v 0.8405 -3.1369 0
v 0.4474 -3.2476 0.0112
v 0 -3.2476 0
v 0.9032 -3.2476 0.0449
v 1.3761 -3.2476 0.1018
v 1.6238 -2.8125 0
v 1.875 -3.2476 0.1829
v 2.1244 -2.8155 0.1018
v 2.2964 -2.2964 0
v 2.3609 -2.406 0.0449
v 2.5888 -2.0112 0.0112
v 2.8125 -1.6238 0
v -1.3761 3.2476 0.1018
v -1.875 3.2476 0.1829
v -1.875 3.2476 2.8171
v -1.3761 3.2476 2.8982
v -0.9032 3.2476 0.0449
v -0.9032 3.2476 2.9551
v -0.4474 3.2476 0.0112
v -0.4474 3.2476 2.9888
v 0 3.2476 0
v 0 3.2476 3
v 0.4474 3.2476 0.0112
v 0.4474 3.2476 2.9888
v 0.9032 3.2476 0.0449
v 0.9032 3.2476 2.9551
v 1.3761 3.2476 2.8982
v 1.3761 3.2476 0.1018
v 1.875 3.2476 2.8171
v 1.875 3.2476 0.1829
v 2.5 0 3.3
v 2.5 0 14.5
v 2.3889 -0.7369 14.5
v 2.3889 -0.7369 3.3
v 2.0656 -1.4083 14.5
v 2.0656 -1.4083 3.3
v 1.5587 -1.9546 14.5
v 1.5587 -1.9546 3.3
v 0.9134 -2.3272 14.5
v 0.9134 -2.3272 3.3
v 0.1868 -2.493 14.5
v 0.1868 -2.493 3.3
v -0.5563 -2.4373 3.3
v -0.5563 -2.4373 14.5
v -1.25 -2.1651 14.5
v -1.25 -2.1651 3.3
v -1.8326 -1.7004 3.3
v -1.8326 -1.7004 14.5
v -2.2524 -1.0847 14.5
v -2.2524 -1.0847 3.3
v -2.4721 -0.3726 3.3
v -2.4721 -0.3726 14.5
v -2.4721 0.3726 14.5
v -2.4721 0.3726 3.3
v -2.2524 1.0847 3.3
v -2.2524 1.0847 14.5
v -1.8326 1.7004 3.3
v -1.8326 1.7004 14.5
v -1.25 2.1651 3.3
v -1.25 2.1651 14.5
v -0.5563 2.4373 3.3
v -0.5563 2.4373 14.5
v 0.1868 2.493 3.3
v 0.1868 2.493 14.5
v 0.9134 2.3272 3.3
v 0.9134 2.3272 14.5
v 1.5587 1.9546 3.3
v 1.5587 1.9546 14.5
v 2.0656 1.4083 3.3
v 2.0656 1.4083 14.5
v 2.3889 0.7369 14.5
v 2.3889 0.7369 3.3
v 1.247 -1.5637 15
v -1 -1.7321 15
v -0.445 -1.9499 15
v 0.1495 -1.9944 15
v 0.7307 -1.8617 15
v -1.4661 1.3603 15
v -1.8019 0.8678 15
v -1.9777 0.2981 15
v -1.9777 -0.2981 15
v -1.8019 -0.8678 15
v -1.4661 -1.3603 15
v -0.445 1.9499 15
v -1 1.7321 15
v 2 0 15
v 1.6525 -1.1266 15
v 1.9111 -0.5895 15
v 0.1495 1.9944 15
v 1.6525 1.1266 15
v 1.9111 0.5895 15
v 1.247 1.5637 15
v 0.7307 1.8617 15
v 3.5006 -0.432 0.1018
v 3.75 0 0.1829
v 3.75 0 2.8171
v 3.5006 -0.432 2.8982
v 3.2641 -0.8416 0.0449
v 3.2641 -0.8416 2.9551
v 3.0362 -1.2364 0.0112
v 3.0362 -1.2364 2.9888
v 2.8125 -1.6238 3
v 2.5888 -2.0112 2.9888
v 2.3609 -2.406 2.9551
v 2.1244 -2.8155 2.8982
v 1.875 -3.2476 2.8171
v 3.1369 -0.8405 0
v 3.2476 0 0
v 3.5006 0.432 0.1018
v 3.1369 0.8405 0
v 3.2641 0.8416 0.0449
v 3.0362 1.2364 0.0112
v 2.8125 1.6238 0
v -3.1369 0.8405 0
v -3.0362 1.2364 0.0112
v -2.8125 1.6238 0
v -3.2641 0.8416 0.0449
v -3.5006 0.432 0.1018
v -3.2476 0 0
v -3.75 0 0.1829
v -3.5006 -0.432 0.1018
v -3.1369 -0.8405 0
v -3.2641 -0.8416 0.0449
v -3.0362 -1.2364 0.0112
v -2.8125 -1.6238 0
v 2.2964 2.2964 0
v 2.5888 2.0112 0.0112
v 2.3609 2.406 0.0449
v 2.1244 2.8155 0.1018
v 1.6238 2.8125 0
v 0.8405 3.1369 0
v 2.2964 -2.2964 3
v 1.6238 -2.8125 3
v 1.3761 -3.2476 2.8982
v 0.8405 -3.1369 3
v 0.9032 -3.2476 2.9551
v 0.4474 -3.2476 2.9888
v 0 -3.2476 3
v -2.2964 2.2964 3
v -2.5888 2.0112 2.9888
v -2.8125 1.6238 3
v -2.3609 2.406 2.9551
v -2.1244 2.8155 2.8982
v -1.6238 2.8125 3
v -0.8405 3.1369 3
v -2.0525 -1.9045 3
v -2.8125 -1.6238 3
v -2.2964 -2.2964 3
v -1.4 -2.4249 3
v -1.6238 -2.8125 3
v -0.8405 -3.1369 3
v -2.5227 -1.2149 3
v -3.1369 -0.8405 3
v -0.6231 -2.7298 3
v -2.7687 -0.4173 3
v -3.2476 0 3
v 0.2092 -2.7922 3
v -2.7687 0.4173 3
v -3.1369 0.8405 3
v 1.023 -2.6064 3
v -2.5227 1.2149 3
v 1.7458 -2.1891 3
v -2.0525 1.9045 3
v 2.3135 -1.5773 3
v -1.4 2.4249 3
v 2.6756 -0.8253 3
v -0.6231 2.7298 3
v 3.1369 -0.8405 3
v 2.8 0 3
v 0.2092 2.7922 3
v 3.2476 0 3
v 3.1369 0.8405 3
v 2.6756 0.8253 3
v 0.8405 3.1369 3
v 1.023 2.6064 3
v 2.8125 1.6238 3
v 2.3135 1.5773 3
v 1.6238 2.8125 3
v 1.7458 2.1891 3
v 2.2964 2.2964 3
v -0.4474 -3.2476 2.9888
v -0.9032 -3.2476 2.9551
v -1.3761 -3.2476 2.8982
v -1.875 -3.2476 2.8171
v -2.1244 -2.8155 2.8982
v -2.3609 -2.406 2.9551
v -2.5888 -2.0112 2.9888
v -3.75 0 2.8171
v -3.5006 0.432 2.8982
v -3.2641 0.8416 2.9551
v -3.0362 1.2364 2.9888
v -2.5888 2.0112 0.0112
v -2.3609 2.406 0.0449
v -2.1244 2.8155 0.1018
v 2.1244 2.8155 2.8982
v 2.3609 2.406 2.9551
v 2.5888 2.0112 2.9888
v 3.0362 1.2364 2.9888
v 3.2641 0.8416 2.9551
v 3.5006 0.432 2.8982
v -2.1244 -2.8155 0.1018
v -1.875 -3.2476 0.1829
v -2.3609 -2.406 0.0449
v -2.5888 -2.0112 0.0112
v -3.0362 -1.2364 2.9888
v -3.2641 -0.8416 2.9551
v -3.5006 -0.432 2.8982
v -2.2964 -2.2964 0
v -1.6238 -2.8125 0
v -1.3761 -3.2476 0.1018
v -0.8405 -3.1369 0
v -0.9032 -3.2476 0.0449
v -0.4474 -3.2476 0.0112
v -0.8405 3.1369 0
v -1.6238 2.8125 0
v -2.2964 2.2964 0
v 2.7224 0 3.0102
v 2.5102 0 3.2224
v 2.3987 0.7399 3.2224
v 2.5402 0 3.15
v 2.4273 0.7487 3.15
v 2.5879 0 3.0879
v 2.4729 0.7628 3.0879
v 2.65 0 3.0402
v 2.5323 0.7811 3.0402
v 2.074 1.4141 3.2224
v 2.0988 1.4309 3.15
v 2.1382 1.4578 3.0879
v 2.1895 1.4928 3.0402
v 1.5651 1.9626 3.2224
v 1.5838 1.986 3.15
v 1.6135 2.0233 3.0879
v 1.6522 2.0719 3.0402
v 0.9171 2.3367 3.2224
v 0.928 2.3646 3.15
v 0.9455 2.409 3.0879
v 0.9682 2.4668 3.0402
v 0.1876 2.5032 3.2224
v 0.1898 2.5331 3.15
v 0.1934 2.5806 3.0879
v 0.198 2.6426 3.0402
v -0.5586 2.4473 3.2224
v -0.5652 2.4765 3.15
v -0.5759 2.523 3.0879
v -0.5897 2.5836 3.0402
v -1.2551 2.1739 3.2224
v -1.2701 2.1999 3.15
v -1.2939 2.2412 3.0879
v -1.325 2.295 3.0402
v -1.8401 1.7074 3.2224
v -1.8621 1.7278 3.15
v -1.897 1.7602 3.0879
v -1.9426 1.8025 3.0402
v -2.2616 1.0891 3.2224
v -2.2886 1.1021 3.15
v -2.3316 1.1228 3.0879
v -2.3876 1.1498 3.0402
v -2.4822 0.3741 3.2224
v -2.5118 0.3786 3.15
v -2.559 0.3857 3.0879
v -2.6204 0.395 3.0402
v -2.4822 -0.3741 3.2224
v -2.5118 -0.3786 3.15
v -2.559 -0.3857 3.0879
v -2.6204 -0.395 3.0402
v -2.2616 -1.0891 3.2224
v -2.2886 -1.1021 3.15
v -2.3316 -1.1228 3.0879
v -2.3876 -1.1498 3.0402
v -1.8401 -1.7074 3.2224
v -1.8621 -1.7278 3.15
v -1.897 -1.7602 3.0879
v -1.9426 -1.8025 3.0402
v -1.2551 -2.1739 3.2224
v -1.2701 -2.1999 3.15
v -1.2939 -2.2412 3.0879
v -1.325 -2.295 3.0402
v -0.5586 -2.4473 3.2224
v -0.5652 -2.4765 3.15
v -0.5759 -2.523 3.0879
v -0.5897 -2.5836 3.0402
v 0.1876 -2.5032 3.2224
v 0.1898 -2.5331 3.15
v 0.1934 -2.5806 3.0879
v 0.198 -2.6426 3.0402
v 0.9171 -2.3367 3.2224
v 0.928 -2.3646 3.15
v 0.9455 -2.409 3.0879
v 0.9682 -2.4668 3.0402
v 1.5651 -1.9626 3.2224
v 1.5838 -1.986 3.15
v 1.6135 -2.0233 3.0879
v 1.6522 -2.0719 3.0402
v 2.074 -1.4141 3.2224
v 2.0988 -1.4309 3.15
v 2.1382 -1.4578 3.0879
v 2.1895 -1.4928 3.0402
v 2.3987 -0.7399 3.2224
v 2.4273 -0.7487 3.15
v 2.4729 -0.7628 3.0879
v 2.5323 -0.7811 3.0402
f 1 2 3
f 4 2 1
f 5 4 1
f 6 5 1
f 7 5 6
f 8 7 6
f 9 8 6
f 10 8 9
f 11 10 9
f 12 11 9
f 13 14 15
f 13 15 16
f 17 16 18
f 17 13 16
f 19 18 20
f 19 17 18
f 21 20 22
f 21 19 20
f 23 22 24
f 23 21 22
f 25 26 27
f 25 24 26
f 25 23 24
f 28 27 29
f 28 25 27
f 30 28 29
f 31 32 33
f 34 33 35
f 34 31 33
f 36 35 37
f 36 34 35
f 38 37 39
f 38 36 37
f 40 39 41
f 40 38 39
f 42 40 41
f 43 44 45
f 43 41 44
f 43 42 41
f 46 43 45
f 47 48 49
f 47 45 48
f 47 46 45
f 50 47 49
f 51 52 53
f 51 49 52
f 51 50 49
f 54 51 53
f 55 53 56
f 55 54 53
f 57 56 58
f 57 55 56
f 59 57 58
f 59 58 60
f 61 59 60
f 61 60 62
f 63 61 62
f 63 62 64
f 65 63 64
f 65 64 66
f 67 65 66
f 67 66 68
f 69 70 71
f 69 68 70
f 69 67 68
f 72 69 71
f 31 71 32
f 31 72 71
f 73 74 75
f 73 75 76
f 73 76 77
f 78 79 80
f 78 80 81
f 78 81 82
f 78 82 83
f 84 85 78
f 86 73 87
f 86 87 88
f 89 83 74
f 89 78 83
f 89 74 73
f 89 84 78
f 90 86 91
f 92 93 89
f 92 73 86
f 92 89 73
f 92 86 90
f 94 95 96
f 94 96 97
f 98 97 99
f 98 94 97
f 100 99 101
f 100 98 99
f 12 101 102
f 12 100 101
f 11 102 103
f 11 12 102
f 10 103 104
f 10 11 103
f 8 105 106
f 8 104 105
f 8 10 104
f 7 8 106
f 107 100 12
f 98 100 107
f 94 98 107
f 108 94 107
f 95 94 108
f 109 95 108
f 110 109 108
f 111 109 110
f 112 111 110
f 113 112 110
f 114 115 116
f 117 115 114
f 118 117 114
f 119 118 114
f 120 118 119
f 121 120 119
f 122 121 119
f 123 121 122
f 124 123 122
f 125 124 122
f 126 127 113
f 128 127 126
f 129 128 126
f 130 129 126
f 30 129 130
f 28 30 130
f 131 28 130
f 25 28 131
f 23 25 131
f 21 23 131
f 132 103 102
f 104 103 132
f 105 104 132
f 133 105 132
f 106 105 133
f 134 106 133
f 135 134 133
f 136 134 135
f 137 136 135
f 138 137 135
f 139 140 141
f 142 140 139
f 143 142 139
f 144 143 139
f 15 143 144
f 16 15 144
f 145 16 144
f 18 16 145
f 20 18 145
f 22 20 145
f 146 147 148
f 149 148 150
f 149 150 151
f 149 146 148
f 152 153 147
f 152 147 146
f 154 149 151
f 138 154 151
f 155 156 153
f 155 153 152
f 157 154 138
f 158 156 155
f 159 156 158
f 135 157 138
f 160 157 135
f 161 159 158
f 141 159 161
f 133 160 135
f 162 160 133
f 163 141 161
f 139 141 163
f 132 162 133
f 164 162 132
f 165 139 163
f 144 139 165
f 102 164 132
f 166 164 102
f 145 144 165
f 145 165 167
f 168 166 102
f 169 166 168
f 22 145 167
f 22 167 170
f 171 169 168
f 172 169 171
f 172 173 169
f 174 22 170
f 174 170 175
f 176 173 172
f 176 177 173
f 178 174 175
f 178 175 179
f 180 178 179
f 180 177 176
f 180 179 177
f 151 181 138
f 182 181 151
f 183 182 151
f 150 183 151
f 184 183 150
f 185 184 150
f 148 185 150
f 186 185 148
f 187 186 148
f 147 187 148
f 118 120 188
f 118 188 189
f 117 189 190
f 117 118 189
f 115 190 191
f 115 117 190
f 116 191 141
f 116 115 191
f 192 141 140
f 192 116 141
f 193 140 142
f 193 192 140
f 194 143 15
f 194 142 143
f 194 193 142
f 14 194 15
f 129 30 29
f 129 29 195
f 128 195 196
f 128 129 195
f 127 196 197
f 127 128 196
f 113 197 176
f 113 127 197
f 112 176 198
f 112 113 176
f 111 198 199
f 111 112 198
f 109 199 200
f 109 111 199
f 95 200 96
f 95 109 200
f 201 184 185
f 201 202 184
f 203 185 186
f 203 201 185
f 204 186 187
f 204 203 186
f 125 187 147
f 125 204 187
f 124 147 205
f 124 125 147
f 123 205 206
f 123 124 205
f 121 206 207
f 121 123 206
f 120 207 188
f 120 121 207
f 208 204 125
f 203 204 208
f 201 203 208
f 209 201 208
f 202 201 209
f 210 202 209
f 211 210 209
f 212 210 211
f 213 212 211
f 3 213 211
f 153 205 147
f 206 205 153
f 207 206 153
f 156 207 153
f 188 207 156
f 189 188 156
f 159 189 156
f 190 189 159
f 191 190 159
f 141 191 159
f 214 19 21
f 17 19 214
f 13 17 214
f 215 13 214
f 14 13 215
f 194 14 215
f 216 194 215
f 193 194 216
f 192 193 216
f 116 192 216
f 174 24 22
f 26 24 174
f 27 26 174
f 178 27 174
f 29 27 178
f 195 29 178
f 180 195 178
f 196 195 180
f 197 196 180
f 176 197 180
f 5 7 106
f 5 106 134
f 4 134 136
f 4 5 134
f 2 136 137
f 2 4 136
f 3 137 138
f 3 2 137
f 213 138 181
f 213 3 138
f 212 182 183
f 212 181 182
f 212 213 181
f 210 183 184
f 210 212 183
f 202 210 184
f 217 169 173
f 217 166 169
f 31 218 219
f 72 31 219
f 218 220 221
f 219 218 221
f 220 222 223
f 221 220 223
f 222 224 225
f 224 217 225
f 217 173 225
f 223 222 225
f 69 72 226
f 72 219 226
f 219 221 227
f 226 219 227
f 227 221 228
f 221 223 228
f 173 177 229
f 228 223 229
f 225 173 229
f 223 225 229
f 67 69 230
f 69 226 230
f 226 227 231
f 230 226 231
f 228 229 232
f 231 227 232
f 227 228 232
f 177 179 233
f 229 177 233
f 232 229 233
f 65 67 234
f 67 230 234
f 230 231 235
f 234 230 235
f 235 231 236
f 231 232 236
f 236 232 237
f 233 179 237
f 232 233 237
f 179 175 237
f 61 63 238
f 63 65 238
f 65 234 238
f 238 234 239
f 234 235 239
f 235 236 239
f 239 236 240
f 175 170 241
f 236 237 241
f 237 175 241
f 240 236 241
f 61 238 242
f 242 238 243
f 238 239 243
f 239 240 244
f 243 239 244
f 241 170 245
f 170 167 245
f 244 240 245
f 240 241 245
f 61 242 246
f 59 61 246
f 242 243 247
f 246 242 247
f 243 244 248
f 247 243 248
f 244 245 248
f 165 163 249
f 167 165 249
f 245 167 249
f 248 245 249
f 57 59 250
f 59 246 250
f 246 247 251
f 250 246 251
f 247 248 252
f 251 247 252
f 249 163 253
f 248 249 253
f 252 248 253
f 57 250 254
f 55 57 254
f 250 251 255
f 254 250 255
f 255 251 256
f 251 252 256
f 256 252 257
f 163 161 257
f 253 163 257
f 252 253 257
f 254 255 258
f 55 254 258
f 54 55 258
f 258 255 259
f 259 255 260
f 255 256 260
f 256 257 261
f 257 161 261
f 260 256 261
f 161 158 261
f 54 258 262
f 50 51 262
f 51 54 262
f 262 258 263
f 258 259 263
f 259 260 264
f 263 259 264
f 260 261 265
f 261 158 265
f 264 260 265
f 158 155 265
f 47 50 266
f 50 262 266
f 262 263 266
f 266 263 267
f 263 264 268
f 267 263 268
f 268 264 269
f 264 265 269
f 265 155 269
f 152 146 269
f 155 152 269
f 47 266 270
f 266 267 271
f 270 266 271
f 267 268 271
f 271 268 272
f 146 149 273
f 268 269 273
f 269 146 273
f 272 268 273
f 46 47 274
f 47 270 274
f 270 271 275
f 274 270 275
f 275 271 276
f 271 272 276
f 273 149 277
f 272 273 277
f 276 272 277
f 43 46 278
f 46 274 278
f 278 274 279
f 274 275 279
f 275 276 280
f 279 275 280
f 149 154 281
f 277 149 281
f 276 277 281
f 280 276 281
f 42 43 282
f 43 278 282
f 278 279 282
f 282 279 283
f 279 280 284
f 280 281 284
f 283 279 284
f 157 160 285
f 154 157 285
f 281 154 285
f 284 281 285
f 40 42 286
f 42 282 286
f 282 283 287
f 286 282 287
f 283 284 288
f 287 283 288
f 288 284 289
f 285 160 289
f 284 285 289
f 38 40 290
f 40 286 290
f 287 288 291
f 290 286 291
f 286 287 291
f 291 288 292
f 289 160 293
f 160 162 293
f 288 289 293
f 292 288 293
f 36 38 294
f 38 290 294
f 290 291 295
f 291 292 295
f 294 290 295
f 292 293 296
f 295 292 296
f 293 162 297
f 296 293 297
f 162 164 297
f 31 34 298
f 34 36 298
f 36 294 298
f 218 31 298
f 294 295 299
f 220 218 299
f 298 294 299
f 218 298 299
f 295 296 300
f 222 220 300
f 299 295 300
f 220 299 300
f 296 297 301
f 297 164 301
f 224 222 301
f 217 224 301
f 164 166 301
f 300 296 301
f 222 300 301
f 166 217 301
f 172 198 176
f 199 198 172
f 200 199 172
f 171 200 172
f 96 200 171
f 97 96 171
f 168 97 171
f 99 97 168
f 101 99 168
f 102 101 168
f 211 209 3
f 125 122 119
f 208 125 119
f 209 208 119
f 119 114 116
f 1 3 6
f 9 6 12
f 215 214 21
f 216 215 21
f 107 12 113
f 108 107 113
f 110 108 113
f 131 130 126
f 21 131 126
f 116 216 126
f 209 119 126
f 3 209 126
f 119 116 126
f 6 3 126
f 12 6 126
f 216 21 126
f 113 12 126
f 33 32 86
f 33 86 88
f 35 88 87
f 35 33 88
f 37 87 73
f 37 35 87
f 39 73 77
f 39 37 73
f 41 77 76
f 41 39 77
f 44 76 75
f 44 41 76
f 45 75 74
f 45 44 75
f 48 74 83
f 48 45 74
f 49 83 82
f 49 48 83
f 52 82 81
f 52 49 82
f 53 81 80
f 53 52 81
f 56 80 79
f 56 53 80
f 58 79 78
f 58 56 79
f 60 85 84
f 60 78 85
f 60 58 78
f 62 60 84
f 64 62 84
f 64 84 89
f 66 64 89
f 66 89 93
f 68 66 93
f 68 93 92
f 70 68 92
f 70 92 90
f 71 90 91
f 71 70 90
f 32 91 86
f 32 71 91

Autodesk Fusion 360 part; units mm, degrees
sketch "草图1" plane through (0, 0, 0) normal (0, 0, 1) x (1, 0, 0) in component "Component"
  line L0 (1.875, 3.2476) -> (3.75, 0)
  line L1 (-1.875, 3.2476) -> (1.875, 3.2476)
  line L2 (-3.75, 0) -> (-1.875, 3.2476)
  line L3 (-1.875, -3.2476) -> (-3.75, 0)
  line L4 (1.875, -3.2476) -> (-1.875, -3.2476)
  line L5 (3.75, 0) -> (1.875, -3.2476)
extrude "拉伸1" add sketch "草图1" along normal blind 3 in component "Component"
sketch "草图2" plane through (0, 0, 0) normal (0, 0, 1) x (1, 0, 0) in component "Component"
  circle A0 centre (0, 0) radius 2.5
extrude "拉伸2" add sketch "草图2" along normal blind 15 in component "Component"
chamfer "倒角1" distance 0.5 angle 45 1 edges at (-2.3308, -0.904, 15) in component "Component"
fillet "圆角1" radius 0.3 1 edges at (-2.3308, 0.904, 3) in component "Component"
sketch "草图3" plane through (0, 0, 0) normal (0, 1, 0) x (1, 0, 0) in component "Component"
  line L0 (3.2476, 0) -> (3.75, 0)
  line L1 (3.75, 0) -> (3.75, -0.1829)
  line L2 (3.75, -0.1829) -> (3.2476, 0)
  line L3 (3.2476, -3) -> (3.75, -3)
  line L4 (3.75, -3) -> (3.75, -2.8171)
  line L5 (3.75, -2.8171) -> (3.2476, -3)
revolve "旋转1" cut sketch "草图3" angle 360 about axis through (0, 0, 1.75) along (0, 0, 1) contours L3 L4 L5 in component "Component"
revolve "旋转2" cut sketch "草图3" angle 360 about axis through (0, 0, 1.75) along (0, 0, 1) contours L0 L1 L2 in component "Component"
thread "螺纹1" in component "Component"
component "Component" placed x (1, 0, 0) y (0, 1, 0) z (0, 0, 1) at (0, 0, 0)
